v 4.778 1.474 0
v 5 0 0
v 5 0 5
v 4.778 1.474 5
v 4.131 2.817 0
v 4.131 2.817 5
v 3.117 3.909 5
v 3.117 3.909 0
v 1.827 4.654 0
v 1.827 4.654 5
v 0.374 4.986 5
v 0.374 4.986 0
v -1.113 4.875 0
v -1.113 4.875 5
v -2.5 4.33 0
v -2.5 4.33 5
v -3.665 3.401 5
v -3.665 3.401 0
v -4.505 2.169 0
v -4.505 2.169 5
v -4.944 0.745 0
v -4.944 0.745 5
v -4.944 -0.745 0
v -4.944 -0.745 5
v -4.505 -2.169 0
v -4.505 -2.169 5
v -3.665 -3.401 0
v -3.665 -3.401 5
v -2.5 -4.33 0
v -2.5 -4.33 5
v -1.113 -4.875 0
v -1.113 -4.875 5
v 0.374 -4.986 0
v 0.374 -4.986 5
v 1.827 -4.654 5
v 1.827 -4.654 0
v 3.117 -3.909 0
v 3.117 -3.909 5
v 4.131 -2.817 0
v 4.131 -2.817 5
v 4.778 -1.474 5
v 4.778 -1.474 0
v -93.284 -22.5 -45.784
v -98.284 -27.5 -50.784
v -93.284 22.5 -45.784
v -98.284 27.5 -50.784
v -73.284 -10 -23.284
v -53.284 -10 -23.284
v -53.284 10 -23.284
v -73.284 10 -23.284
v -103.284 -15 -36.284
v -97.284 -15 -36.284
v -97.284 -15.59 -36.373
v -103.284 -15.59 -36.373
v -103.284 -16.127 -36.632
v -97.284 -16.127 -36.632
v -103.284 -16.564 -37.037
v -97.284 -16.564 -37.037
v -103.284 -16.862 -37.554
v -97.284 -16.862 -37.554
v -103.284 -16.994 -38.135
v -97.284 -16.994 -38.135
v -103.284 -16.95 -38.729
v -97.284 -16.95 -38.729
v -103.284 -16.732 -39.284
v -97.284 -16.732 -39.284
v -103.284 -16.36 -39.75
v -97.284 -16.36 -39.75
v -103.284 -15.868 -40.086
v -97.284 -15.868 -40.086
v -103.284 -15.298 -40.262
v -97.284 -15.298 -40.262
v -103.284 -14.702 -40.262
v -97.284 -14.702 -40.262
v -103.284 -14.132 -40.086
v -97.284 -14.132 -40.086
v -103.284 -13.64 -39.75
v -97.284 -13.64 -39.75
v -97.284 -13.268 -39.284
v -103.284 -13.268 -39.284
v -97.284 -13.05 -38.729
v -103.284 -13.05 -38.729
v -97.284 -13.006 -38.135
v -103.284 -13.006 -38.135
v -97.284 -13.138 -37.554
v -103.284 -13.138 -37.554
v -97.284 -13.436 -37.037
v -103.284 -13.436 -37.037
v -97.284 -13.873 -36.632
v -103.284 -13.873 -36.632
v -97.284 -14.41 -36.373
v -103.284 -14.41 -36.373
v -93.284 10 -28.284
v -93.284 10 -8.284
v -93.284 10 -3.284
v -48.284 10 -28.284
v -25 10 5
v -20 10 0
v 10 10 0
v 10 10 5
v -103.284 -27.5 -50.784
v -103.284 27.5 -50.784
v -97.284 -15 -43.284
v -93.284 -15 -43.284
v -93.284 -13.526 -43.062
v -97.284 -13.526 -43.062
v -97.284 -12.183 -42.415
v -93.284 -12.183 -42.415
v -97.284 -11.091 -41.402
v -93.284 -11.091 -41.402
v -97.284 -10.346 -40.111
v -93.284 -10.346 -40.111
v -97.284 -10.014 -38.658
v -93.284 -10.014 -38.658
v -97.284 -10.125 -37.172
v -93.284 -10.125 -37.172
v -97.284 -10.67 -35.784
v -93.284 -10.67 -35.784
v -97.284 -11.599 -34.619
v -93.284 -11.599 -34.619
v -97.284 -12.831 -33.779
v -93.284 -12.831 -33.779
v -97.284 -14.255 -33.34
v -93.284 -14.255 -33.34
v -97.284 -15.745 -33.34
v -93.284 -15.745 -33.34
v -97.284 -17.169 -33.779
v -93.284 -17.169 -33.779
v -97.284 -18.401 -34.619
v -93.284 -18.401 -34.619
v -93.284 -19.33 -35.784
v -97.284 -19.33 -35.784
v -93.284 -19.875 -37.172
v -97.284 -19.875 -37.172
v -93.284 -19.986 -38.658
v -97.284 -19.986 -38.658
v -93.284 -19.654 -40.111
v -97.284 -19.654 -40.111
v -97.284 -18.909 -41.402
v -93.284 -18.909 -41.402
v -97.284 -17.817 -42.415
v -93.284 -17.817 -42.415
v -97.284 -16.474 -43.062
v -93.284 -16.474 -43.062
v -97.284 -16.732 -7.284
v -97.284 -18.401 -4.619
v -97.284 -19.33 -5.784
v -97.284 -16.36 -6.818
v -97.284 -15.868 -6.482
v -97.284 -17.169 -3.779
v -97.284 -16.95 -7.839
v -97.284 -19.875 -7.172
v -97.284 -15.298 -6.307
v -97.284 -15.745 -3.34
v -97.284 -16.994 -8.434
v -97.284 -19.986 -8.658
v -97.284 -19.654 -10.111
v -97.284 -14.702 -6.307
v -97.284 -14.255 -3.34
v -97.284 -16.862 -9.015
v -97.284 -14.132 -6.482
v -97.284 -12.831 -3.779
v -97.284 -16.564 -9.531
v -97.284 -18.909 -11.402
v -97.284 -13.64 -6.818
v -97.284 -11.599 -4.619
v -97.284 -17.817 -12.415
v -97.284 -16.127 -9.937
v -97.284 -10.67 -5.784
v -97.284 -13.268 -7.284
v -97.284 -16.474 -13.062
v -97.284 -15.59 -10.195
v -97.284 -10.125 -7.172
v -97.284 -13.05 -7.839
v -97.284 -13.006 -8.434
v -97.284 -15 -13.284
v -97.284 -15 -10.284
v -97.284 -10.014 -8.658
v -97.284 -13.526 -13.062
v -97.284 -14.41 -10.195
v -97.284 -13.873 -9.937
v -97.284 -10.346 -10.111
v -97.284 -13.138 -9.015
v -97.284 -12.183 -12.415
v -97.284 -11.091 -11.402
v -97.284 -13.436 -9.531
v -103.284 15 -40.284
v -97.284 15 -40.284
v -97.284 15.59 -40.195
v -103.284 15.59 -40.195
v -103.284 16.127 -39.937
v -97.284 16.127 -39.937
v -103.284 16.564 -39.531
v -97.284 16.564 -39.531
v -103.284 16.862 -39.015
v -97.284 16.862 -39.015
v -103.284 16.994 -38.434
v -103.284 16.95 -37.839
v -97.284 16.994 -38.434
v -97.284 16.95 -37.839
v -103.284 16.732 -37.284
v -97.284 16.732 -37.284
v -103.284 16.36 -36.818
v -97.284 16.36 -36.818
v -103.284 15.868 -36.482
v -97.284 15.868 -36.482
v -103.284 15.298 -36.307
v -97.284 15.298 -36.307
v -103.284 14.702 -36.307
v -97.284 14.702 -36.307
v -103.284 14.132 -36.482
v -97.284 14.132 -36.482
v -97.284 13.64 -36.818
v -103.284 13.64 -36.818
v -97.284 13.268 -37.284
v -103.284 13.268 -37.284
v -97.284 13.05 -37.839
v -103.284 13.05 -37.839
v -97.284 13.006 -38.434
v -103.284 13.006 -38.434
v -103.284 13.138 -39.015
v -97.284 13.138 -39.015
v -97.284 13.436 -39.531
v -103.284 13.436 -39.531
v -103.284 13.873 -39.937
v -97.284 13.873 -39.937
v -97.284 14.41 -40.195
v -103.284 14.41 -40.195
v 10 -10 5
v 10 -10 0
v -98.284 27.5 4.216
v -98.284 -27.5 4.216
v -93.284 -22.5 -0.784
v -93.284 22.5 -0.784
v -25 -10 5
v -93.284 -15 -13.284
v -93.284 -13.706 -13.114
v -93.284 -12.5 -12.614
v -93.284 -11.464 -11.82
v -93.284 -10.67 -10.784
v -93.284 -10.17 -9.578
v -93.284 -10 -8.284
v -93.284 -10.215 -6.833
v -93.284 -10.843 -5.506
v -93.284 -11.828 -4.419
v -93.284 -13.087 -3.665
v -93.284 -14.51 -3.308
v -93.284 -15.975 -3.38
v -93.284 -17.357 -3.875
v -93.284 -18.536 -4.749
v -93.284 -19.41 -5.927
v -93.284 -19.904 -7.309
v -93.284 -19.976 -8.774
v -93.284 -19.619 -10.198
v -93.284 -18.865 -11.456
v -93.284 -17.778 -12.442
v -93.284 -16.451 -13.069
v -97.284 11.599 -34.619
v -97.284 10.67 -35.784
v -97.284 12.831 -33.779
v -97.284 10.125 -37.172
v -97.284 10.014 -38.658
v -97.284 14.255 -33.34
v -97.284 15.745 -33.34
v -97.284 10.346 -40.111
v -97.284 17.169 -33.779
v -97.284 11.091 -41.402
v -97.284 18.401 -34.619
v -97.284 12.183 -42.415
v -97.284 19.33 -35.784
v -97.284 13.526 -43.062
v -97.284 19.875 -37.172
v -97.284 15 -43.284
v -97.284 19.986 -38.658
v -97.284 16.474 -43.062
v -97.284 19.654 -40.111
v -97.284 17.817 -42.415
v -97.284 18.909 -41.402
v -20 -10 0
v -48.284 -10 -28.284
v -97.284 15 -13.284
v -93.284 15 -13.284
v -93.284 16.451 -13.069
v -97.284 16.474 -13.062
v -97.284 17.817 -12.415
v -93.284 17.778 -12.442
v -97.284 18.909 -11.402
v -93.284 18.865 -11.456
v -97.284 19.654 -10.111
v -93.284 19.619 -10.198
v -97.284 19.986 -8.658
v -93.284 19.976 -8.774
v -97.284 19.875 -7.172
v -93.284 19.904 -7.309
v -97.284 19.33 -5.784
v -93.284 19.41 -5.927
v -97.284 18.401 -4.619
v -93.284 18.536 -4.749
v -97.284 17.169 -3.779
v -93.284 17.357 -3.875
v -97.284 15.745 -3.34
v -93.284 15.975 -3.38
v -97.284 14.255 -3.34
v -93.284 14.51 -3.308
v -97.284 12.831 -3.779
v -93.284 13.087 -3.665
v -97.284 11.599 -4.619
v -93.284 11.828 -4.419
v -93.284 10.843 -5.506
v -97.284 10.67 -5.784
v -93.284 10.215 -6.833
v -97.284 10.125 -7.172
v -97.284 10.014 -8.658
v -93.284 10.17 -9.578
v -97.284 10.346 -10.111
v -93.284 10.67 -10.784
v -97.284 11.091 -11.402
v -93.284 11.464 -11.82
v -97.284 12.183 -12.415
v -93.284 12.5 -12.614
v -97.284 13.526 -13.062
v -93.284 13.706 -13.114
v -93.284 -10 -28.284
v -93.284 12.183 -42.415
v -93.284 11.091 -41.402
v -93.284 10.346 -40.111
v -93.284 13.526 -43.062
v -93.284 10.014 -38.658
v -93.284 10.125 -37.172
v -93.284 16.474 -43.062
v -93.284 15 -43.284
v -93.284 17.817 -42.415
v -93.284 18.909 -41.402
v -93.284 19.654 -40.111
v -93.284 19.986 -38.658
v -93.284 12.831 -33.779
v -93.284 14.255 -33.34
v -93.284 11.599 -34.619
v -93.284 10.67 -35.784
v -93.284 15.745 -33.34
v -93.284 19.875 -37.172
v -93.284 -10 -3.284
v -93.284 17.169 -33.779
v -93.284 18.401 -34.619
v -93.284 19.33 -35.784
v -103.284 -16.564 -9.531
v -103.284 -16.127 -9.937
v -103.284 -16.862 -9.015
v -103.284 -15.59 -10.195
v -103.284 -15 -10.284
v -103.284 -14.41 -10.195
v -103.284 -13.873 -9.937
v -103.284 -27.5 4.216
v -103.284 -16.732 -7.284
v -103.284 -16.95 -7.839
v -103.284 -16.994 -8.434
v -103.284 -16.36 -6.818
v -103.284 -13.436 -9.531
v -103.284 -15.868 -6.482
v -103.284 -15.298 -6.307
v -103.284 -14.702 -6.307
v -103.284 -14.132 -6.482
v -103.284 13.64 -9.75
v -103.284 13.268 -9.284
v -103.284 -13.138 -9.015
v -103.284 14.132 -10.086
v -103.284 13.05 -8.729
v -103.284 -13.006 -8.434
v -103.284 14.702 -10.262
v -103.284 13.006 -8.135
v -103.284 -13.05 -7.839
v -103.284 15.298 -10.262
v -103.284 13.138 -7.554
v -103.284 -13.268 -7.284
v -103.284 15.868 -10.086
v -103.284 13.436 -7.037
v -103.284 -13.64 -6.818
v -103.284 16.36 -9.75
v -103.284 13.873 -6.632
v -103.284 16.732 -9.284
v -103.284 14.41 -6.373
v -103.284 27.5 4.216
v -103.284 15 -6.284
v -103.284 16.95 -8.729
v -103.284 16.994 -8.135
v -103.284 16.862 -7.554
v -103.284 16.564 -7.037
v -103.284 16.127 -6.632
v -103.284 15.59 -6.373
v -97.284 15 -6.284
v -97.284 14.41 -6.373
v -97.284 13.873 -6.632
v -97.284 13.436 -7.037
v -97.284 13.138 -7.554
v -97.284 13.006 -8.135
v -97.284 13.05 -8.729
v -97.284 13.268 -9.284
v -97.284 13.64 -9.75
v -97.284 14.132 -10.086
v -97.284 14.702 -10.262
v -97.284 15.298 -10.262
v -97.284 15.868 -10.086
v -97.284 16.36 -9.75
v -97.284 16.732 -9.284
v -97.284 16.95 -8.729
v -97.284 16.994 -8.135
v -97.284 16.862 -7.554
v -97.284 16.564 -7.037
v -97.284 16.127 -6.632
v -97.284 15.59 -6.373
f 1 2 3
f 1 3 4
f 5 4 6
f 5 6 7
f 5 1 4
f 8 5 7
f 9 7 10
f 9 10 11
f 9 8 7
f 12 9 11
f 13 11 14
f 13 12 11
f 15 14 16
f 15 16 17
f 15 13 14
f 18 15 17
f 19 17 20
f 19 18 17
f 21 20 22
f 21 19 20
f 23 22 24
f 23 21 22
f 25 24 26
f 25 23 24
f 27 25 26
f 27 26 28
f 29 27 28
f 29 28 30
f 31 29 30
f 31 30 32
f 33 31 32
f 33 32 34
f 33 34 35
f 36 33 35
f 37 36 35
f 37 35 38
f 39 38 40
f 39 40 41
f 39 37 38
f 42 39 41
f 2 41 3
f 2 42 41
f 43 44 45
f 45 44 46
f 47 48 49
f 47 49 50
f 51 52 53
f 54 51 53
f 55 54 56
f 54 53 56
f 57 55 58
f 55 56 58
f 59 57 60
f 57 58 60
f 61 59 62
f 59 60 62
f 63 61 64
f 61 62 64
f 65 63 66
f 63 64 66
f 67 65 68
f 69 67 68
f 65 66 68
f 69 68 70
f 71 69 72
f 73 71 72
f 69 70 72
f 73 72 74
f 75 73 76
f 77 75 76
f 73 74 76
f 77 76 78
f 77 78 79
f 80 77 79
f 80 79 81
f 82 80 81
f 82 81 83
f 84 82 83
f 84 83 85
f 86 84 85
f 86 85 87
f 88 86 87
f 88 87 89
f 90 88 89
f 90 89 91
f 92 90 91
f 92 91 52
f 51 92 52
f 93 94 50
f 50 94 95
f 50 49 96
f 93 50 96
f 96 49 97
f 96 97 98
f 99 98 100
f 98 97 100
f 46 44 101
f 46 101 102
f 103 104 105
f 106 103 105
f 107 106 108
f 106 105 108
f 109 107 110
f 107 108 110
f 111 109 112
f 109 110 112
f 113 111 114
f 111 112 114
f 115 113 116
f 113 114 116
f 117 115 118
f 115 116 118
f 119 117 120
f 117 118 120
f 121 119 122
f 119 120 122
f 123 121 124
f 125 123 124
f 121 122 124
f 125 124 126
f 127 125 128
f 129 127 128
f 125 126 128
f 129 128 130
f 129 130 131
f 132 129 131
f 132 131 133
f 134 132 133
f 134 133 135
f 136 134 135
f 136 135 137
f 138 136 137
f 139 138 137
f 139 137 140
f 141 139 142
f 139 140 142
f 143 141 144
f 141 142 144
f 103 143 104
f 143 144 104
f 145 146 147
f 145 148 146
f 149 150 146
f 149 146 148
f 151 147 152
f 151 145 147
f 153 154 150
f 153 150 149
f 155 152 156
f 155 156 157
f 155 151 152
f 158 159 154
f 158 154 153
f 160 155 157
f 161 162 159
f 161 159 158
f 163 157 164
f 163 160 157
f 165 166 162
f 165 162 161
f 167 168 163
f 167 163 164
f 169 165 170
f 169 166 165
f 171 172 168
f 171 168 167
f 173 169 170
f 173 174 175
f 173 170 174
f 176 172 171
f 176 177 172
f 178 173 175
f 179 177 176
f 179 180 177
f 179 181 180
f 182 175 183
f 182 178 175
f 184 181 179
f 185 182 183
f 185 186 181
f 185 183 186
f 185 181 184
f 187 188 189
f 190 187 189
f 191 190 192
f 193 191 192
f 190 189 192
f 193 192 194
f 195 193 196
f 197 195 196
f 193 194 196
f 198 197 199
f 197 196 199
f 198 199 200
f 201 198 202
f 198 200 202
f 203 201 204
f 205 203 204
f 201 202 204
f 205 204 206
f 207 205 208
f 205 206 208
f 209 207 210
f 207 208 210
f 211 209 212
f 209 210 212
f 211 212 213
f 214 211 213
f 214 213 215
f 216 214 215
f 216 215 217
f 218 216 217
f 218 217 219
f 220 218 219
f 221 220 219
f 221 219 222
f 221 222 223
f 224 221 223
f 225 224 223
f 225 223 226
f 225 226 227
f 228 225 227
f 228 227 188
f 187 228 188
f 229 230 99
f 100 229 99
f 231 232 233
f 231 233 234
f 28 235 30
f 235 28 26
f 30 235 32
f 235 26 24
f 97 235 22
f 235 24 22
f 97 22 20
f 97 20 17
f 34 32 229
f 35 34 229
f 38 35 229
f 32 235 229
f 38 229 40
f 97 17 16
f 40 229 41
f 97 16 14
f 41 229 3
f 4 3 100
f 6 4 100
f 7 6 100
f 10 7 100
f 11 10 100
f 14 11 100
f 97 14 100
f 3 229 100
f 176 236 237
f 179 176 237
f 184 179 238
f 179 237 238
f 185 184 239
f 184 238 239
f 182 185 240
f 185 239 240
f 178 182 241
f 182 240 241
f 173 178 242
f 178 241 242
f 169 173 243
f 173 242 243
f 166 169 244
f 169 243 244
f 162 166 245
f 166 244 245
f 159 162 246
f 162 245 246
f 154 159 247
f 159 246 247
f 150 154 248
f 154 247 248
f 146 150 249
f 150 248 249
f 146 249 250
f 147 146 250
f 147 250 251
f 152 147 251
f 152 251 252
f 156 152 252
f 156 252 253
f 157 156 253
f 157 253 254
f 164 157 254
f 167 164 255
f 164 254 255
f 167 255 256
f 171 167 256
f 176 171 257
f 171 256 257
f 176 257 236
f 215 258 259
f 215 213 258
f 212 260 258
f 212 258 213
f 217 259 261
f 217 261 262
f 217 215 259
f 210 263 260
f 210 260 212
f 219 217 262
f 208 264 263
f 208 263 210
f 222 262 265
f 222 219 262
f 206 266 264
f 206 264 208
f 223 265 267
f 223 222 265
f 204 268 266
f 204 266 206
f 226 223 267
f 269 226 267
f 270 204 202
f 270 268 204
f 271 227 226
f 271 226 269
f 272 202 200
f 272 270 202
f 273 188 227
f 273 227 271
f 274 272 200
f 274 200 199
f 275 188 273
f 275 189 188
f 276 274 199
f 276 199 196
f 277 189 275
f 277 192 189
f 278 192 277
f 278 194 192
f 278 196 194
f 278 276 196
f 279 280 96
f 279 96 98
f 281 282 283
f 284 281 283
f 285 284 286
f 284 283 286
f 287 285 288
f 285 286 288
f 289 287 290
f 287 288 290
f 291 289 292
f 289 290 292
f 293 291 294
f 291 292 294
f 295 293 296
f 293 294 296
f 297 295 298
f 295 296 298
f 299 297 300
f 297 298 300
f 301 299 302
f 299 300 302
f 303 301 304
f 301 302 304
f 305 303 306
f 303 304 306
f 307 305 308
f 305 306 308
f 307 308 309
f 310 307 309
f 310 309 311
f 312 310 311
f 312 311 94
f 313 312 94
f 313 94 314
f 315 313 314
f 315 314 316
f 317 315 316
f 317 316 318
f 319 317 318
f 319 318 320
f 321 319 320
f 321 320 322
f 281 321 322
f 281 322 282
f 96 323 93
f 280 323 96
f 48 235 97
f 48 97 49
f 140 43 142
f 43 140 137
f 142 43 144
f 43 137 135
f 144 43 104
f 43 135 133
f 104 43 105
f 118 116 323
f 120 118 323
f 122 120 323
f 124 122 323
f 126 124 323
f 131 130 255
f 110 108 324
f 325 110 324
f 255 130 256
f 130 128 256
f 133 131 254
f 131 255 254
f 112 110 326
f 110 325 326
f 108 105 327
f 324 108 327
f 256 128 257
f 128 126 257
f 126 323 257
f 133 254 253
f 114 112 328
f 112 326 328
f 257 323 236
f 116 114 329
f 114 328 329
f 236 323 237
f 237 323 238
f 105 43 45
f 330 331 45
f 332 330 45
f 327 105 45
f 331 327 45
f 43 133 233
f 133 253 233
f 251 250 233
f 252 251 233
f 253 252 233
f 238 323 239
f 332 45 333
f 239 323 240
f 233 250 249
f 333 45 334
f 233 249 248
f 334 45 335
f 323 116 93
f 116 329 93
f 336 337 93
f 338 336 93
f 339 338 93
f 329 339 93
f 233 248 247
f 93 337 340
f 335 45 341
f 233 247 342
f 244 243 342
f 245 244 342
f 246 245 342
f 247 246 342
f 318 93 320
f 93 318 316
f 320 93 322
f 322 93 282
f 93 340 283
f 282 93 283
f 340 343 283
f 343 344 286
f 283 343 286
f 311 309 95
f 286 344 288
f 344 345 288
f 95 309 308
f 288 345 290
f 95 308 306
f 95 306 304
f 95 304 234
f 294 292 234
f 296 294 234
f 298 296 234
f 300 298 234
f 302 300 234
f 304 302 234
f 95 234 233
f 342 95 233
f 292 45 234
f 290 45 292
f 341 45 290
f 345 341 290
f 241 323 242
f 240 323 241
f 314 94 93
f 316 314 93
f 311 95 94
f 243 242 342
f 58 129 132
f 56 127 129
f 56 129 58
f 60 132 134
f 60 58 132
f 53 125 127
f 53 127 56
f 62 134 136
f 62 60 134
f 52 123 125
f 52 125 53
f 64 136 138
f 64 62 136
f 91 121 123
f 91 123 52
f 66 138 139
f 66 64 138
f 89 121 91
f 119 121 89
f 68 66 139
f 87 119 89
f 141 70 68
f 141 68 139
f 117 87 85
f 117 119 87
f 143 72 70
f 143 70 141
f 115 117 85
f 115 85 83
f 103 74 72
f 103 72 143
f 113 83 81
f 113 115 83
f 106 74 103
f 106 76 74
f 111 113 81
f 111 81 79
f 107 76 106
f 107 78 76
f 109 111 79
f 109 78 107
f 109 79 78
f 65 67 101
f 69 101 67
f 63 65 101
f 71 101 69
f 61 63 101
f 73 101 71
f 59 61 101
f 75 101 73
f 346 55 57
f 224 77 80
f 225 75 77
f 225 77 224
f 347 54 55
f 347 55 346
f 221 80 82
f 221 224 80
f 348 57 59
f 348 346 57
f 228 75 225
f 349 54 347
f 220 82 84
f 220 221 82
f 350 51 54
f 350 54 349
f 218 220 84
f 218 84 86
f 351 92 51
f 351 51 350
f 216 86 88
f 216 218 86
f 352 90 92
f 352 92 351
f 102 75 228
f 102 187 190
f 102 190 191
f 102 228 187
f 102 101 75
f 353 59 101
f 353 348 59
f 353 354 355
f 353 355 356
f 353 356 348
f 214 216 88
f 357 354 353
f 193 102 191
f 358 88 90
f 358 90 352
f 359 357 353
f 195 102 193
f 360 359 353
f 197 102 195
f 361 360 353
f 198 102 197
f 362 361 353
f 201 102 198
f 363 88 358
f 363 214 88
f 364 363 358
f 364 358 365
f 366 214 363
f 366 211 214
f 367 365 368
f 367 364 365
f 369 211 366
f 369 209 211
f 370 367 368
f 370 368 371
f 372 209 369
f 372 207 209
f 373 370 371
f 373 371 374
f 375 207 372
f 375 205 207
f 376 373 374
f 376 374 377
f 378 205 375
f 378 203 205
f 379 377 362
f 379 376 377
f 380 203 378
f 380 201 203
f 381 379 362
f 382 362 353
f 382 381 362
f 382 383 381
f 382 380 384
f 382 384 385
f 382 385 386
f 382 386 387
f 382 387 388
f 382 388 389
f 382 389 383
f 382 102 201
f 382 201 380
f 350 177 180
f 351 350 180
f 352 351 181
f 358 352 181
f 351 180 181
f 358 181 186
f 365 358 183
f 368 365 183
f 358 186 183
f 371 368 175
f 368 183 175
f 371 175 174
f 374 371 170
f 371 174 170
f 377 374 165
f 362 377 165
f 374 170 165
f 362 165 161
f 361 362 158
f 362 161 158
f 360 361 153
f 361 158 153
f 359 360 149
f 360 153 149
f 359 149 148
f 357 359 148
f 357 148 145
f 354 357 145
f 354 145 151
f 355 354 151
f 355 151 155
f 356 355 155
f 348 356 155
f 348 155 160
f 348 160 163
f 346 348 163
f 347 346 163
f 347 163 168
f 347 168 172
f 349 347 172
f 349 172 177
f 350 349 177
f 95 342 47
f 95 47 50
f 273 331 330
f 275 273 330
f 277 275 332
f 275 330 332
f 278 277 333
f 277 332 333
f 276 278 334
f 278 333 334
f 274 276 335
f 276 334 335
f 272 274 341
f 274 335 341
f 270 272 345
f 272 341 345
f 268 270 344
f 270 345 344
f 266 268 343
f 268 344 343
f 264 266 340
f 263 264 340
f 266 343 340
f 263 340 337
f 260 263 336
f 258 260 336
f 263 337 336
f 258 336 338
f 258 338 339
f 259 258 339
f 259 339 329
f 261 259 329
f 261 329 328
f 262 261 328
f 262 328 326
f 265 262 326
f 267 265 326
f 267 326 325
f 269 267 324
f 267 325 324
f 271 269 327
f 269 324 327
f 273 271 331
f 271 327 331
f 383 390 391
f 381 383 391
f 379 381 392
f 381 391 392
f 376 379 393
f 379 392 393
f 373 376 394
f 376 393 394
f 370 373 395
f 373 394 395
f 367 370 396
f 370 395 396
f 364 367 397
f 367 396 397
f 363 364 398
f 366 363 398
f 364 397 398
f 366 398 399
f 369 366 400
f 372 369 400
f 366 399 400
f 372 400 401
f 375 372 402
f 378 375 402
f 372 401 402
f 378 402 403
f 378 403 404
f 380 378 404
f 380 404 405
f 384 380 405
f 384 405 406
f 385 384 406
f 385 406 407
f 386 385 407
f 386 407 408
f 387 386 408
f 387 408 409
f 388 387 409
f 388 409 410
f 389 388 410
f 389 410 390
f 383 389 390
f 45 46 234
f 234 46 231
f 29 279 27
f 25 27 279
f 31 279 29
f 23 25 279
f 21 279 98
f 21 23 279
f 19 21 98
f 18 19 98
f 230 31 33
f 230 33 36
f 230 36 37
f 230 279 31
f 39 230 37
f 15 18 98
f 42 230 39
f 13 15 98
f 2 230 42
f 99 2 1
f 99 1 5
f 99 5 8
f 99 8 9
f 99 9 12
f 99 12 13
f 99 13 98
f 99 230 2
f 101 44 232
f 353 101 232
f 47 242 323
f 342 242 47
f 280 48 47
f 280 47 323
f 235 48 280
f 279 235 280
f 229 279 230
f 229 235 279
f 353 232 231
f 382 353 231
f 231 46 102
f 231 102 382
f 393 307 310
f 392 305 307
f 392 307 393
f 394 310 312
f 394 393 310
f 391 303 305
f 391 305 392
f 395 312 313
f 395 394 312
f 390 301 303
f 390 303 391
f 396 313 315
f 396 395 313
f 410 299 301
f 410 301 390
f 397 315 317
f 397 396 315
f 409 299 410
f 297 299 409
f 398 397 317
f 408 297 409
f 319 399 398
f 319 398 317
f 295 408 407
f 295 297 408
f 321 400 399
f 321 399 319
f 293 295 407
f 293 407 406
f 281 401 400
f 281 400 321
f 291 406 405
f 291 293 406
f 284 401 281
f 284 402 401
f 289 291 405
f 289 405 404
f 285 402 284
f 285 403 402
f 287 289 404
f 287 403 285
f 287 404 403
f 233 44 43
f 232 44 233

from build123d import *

# Parameters (mm, degrees)
SKETCH1_W           = 20
SKETCH1_H           = 20
SKETCH1_R           = 5
BOSS_EXTRUDE1_DEPTH = 5
SKETCH2_W           = 5
SKETCH2_H           = 20
BOSS_EXTRUDE2_DEPTH = 15
BOSS_EXTRUDE3_DEPTH = 20
SKETCH4_W           = 55
SKETCH4_H           = 55
BOSS_EXTRUDE4_DEPTH = 10
CHAMFER1_SIZE       = 20
CHAMFER2_SIZE       = 5
SKETCH5_R           = 2
CUT_EXTRUDE1_DEPTH  = 119.333988749
SKETCH6_R           = 5
SKETCH6_R_2         = 2
CUT_EXTRUDE2_DEPTH  = 4


with BuildPart() as part:
    # Sketch1 → Boss-Extrude1 (new body)
    with BuildSketch(Plane.XY):
        Rectangle(SKETCH1_W, SKETCH1_H)
        Circle(SKETCH1_R, mode=Mode.SUBTRACT)
    extrude(amount=BOSS_EXTRUDE1_DEPTH)

    # Sketch2 → Boss-Extrude2 (add)
    with BuildSketch(Plane.ZY.offset(10)):
        with Locations((2.5, 0)):
            Rectangle(SKETCH2_W, SKETCH2_H)
    extrude(amount=BOSS_EXTRUDE2_DEPTH)

    # Sketch3 → Boss-Extrude3 (add)
    with BuildSketch(Plane.XZ.offset(10)):
        Polygon((-25, 0), (-25, 5), (-53.284271247, -23.284271247), (-48.284271247, -23.284271247), (-48.284271247, -28.284271247), (-20, 0), align=None)
        Polygon((-48.284271247, -28.284271247), (-53.284271247, -23.284271247), (-93.284271247, -23.284271247), (-93.284271247, -28.284271247), align=None)
        Polygon((-48.284271247, -23.284271247), (-53.284271247, -23.284271247), (-48.284271247, -28.284271247), align=None)
    extrude(amount=-BOSS_EXTRUDE3_DEPTH)

    # Sketch4 → Boss-Extrude4 (add)
    with BuildSketch(Plane.ZY.offset(93.284271247)):
        with Locations((-23.284271247, 0)):
            Rectangle(SKETCH4_W, SKETCH4_H)
    extrude(amount=BOSS_EXTRUDE4_DEPTH)

    # Chamfer1
    chamfer1_edges = [part.edges().sort_by_distance(p)[0] for p in [
        (-93.284271247, 0, -23.284271247),
    ]]
    chamfer(chamfer1_edges, length=CHAMFER1_SIZE)

    # Chamfer2
    chamfer2_edges = [part.edges().sort_by_distance(p)[0] for p in [
        (-93.284271247, 0, -50.784271247),
        (-93.284271247, -27.5, -23.284271247),
        (-93.284271247, 0, 4.215728753),
        (-93.284271247, 27.5, -23.284271247),
    ]]
    chamfer(chamfer2_edges, length=CHAMFER2_SIZE)

    # Sketch5 → Cut-Extrude1 (cut, through all)
    with BuildSketch(Plane(origin=(-93.284271247, 0, 0), x_dir=(0, 0, -1), z_dir=(1, 0, 0))):
        with Locations((38.284271247, 15)):
            Circle(SKETCH5_R)
        with Locations(Location((38.284271247, -15, 0), (0, 0, 180))):
            Circle(SKETCH5_R)
        with Locations((8.284271247, -15)):
            Circle(SKETCH5_R)
        with Locations(Location((8.284271247, 15, 0), (0, 0, 180))):
            Circle(SKETCH5_R)
    extrude(amount=-CUT_EXTRUDE1_DEPTH, mode=Mode.SUBTRACT)

    # Sketch6 → Cut-Extrude2 (cut)
    # profile 1 of 4: a face of its own
    with BuildSketch(Plane(origin=(-93.284271247, 0, 0), x_dir=(0, 0, -1), z_dir=(1, 0, 0))):
        with Locations((8.284271247, 15)):
            Circle(SKETCH6_R)
        with Locations((8.284271247, 15)):
            Circle(SKETCH6_R_2, mode=Mode.SUBTRACT)
    # profile 2 of 4: a face of its own
    with BuildSketch(Plane(origin=(-93.284271247, 0, 0), x_dir=(0, 0, -1), z_dir=(1, 0, 0))):
        with Locations((8.284271247, -15)):
            Circle(SKETCH6_R)
        with Locations((8.284271247, -15)):
            Circle(SKETCH6_R_2, mode=Mode.SUBTRACT)
    # profile 3 of 4: a face of its own
    with BuildSketch(Plane(origin=(-93.284271247, 0, 0), x_dir=(0, 0, -1), z_dir=(1, 0, 0))):
        with Locations((38.284271247, -15)):
            Circle(SKETCH6_R)
        with Locations((38.284271247, -15)):
            Circle(SKETCH6_R_2, mode=Mode.SUBTRACT)
    # profile 4 of 4: a face of its own
    with BuildSketch(Plane(origin=(-93.284271247, 0, 0), x_dir=(0, 0, -1), z_dir=(1, 0, 0))):
        with Locations((38.284271247, 15)):
            Circle(SKETCH6_R)
        with Locations((38.284271247, 15)):
            Circle(SKETCH6_R_2, mode=Mode.SUBTRACT)
    extrude(amount=-CUT_EXTRUDE2_DEPTH, mode=Mode.SUBTRACT)


solid = part.part
